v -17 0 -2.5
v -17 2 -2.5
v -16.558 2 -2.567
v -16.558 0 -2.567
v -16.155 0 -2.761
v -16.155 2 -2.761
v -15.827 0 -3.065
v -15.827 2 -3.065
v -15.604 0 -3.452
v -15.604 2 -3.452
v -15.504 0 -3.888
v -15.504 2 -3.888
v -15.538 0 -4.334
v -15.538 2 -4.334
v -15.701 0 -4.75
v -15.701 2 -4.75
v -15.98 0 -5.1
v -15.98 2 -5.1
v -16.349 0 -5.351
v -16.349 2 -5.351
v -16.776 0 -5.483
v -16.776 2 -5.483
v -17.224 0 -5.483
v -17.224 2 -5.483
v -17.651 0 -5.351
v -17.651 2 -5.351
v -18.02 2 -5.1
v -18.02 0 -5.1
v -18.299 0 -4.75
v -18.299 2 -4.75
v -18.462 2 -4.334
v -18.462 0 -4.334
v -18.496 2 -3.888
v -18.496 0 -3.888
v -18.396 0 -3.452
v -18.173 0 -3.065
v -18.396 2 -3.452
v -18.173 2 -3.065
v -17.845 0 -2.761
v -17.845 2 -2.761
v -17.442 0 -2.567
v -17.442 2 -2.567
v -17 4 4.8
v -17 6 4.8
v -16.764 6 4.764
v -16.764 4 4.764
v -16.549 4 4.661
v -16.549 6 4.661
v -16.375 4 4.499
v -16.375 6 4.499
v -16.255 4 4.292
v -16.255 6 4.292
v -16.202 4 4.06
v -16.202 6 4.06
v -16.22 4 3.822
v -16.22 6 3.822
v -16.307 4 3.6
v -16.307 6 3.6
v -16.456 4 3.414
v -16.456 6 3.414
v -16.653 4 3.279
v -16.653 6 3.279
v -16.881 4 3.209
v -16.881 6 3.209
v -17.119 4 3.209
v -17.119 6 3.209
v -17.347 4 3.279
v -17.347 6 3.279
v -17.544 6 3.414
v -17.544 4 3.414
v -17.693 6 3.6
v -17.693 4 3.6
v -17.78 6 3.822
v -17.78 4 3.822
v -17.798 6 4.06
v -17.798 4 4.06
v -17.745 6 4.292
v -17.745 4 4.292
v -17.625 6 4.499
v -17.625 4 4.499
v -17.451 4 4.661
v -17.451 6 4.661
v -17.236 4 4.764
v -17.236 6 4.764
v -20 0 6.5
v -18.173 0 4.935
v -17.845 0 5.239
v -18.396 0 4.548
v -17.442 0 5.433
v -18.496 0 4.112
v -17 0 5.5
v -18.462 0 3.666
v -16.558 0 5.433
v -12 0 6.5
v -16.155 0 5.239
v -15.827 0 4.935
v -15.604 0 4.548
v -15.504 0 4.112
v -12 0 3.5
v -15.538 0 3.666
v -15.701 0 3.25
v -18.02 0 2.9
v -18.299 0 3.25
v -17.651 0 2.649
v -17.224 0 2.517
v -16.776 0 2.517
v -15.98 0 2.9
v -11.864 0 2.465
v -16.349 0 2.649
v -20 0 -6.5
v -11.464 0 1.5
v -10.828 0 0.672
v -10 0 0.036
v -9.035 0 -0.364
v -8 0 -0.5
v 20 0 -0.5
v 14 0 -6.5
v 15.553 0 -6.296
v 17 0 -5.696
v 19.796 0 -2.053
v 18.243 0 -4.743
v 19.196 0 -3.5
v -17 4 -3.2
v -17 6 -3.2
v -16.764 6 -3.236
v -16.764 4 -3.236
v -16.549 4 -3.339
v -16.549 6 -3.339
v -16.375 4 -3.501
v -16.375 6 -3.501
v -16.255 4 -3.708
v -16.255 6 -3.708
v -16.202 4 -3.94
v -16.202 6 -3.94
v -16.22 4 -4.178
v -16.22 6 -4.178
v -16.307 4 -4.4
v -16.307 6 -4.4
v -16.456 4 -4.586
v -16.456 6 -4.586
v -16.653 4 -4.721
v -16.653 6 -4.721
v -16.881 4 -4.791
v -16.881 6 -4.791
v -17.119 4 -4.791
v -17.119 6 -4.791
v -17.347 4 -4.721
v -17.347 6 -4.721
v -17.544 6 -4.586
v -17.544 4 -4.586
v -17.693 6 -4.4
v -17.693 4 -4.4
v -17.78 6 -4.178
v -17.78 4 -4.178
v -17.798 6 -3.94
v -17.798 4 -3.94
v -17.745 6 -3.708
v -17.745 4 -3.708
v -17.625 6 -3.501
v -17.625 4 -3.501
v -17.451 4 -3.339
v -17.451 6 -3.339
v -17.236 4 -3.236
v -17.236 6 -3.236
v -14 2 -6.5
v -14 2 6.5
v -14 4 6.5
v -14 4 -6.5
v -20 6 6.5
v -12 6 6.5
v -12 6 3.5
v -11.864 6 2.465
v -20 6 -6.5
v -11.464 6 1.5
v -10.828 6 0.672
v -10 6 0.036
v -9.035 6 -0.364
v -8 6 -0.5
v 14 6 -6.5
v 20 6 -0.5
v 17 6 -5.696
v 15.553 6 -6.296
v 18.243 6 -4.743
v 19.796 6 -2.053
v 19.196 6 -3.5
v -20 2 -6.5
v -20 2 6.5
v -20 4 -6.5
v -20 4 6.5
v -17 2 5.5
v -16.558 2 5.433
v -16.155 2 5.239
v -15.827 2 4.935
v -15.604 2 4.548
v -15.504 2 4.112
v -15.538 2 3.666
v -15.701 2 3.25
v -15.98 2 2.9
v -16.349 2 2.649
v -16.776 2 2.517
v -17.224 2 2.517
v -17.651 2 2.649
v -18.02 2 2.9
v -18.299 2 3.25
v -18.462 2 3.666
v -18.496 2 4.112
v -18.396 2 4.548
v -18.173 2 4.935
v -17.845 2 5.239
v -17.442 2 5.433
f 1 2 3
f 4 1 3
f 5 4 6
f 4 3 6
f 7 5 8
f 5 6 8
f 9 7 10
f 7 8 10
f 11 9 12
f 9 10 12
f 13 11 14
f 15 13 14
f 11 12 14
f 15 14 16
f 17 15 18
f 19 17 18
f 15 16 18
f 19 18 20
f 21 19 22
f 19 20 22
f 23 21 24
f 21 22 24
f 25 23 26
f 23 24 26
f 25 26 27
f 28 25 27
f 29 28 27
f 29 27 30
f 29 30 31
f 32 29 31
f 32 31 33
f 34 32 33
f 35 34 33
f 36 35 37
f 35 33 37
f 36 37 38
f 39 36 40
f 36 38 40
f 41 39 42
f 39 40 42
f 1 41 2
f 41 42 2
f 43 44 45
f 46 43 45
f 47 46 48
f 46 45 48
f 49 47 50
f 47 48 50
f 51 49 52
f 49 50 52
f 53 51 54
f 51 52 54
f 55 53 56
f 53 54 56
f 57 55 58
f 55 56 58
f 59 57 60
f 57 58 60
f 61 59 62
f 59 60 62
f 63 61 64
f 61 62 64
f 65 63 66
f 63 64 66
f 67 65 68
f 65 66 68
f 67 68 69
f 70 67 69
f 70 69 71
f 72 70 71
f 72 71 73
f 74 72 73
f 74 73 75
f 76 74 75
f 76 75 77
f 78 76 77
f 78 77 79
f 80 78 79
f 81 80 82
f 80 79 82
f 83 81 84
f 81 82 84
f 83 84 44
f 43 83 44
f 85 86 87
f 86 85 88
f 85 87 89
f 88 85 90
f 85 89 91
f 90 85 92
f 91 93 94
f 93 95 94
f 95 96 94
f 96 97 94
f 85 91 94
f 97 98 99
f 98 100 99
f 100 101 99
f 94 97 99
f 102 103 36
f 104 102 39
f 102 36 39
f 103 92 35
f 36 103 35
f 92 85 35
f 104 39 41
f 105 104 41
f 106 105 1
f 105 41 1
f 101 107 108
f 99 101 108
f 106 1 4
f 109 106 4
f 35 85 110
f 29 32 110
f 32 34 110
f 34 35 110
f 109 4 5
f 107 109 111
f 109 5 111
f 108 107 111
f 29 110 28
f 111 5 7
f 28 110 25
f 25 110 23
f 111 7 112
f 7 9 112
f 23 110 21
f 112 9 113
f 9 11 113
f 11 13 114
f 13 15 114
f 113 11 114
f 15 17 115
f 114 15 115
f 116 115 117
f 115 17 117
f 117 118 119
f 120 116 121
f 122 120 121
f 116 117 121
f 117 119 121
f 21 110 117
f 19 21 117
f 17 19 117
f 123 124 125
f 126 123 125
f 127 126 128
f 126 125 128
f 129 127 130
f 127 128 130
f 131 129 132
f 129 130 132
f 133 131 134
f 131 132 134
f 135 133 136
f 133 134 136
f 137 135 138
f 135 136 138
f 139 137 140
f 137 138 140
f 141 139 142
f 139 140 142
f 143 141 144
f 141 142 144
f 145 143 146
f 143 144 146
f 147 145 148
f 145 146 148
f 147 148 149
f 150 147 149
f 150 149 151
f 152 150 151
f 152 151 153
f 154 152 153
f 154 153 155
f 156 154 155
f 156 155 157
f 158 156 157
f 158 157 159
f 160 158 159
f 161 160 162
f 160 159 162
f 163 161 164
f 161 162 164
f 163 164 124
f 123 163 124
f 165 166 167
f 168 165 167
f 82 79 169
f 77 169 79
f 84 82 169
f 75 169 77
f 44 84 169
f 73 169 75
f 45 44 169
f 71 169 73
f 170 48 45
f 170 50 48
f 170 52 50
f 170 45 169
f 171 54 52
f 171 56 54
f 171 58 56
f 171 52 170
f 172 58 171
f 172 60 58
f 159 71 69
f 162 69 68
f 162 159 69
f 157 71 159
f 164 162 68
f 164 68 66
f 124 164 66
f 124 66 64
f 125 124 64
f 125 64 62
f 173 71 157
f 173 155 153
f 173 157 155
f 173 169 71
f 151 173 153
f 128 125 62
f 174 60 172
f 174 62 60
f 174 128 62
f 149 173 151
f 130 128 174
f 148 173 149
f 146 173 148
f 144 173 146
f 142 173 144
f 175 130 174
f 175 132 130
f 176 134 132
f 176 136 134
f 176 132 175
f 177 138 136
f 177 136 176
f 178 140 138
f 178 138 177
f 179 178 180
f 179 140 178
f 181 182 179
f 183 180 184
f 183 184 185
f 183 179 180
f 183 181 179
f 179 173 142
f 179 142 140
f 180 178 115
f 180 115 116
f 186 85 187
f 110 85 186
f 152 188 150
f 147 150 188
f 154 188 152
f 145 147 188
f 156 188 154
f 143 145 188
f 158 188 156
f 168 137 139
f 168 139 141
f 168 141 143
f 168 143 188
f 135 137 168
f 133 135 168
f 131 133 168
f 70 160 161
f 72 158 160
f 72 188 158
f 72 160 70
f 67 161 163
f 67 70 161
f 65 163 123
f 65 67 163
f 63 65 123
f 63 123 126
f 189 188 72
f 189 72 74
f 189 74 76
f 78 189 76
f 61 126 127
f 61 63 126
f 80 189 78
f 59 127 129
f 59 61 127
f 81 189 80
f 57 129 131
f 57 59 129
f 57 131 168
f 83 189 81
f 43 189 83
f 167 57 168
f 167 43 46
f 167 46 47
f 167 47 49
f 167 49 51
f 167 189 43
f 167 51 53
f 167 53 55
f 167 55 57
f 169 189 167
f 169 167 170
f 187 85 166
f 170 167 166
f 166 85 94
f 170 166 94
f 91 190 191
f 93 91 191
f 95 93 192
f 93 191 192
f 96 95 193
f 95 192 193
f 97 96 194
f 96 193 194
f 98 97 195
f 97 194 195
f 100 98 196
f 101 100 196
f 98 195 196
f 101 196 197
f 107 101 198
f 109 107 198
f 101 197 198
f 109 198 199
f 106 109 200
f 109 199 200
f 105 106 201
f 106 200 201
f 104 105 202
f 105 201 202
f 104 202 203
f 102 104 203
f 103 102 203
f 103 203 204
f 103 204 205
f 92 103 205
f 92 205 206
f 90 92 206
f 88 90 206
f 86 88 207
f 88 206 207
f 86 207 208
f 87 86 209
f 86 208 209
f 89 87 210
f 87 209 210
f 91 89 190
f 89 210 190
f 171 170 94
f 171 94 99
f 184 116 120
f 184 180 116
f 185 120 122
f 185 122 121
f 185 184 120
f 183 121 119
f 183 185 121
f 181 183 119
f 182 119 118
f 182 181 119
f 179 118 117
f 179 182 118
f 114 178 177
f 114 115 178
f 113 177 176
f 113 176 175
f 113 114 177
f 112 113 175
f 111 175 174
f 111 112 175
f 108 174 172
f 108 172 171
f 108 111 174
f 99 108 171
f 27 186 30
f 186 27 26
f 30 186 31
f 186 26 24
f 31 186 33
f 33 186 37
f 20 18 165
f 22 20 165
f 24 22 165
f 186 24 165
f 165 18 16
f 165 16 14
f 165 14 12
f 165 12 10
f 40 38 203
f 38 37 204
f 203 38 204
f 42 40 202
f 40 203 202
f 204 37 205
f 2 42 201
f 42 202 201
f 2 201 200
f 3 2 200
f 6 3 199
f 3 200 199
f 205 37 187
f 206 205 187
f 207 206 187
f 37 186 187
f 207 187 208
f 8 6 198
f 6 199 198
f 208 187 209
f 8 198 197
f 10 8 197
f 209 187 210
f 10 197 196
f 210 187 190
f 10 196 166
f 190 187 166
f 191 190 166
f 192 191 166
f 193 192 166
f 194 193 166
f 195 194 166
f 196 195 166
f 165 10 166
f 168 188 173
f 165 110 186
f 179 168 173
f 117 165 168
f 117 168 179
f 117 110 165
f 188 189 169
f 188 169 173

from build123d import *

# Parameters (mm, degrees)
SKETCH1_W           = 40
SKETCH1_H           = 13
BOSS_EXTRUDE1_DEPTH = 6
SKETCH2_W           = 6
SKETCH2_H           = 2
CUT_EXTRUDE1_DEPTH  = 25.596747752
SKETCH3_R           = 0.8
CUT_EXTRUDE2_DEPTH  = 2
SKETCH4_W           = 32
SKETCH4_H           = 7
CUT_EXTRUDE3_DEPTH  = 22.868927729
FILLET1_R           = 4
FILLET3_R           = 6
SKETCH5_R           = 1.5
CUT_EXTRUDE4_DEPTH  = 2


with BuildPart() as part:
    # Sketch1 → Boss-Extrude1 (new body)
    with BuildSketch(Plane(origin=(0, 0, 0), x_dir=(1, 0, 0), z_dir=(0, 1, 0))):
        Rectangle(SKETCH1_W, SKETCH1_H)
    extrude(amount=BOSS_EXTRUDE1_DEPTH)

    # Sketch2 → Cut-Extrude1 (cut, through all)
    with BuildSketch(Plane.XY.offset(6.5)):
        with Locations((-17, 3)):
            Rectangle(SKETCH2_W, SKETCH2_H)
    extrude(amount=-CUT_EXTRUDE1_DEPTH, mode=Mode.SUBTRACT)

    # Sketch3 → Cut-Extrude2 (cut)
    with BuildSketch(Plane(origin=(0, 6, 0), x_dir=(1, 0, 0), z_dir=(0, 1, 0))):
        with Locations(Location((-17, 4, 0), (0, 0, 270))):
            Circle(SKETCH3_R)
        with Locations(Location((-17, -4, 0), (0, 0, 270))):
            Circle(SKETCH3_R)
    extrude(amount=-CUT_EXTRUDE2_DEPTH, mode=Mode.SUBTRACT)

    # Sketch4 → Cut-Extrude3 (cut, through all)
    with BuildSketch(Plane(origin=(0, 6, 0), x_dir=(1, 0, 0), z_dir=(0, 1, 0))):
        with Locations((4, -3)):
            Rectangle(SKETCH4_W, SKETCH4_H)
    extrude(amount=-CUT_EXTRUDE3_DEPTH, mode=Mode.SUBTRACT)

    # Fillet1
    fillet1_edges = [part.edges().sort_by_distance(p)[0] for p in [
        (-12, 3, -0.5),
    ]]
    fillet(fillet1_edges, radius=FILLET1_R)

    # Fillet3
    fillet3_edges = [part.edges().sort_by_distance(p)[0] for p in [
        (20, 3, -6.5),
    ]]
    fillet(fillet3_edges, radius=FILLET3_R - 0.0001)  # a hair under: the kernel refuses the full size

    # Sketch5 → Cut-Extrude4 (cut)
    with BuildSketch(Plane(origin=(0, 2, 0), x_dir=(1, 0, 0), z_dir=(0, 1, 0))):
        with Locations(Location((-17, 4, 0), (0, 0, 270))):
            Circle(SKETCH5_R)
        with Locations(Location((-17, -4, 0), (0, 0, 270))):
            Circle(SKETCH5_R)
    extrude(amount=-CUT_EXTRUDE4_DEPTH, mode=Mode.SUBTRACT)


solid = part.part
